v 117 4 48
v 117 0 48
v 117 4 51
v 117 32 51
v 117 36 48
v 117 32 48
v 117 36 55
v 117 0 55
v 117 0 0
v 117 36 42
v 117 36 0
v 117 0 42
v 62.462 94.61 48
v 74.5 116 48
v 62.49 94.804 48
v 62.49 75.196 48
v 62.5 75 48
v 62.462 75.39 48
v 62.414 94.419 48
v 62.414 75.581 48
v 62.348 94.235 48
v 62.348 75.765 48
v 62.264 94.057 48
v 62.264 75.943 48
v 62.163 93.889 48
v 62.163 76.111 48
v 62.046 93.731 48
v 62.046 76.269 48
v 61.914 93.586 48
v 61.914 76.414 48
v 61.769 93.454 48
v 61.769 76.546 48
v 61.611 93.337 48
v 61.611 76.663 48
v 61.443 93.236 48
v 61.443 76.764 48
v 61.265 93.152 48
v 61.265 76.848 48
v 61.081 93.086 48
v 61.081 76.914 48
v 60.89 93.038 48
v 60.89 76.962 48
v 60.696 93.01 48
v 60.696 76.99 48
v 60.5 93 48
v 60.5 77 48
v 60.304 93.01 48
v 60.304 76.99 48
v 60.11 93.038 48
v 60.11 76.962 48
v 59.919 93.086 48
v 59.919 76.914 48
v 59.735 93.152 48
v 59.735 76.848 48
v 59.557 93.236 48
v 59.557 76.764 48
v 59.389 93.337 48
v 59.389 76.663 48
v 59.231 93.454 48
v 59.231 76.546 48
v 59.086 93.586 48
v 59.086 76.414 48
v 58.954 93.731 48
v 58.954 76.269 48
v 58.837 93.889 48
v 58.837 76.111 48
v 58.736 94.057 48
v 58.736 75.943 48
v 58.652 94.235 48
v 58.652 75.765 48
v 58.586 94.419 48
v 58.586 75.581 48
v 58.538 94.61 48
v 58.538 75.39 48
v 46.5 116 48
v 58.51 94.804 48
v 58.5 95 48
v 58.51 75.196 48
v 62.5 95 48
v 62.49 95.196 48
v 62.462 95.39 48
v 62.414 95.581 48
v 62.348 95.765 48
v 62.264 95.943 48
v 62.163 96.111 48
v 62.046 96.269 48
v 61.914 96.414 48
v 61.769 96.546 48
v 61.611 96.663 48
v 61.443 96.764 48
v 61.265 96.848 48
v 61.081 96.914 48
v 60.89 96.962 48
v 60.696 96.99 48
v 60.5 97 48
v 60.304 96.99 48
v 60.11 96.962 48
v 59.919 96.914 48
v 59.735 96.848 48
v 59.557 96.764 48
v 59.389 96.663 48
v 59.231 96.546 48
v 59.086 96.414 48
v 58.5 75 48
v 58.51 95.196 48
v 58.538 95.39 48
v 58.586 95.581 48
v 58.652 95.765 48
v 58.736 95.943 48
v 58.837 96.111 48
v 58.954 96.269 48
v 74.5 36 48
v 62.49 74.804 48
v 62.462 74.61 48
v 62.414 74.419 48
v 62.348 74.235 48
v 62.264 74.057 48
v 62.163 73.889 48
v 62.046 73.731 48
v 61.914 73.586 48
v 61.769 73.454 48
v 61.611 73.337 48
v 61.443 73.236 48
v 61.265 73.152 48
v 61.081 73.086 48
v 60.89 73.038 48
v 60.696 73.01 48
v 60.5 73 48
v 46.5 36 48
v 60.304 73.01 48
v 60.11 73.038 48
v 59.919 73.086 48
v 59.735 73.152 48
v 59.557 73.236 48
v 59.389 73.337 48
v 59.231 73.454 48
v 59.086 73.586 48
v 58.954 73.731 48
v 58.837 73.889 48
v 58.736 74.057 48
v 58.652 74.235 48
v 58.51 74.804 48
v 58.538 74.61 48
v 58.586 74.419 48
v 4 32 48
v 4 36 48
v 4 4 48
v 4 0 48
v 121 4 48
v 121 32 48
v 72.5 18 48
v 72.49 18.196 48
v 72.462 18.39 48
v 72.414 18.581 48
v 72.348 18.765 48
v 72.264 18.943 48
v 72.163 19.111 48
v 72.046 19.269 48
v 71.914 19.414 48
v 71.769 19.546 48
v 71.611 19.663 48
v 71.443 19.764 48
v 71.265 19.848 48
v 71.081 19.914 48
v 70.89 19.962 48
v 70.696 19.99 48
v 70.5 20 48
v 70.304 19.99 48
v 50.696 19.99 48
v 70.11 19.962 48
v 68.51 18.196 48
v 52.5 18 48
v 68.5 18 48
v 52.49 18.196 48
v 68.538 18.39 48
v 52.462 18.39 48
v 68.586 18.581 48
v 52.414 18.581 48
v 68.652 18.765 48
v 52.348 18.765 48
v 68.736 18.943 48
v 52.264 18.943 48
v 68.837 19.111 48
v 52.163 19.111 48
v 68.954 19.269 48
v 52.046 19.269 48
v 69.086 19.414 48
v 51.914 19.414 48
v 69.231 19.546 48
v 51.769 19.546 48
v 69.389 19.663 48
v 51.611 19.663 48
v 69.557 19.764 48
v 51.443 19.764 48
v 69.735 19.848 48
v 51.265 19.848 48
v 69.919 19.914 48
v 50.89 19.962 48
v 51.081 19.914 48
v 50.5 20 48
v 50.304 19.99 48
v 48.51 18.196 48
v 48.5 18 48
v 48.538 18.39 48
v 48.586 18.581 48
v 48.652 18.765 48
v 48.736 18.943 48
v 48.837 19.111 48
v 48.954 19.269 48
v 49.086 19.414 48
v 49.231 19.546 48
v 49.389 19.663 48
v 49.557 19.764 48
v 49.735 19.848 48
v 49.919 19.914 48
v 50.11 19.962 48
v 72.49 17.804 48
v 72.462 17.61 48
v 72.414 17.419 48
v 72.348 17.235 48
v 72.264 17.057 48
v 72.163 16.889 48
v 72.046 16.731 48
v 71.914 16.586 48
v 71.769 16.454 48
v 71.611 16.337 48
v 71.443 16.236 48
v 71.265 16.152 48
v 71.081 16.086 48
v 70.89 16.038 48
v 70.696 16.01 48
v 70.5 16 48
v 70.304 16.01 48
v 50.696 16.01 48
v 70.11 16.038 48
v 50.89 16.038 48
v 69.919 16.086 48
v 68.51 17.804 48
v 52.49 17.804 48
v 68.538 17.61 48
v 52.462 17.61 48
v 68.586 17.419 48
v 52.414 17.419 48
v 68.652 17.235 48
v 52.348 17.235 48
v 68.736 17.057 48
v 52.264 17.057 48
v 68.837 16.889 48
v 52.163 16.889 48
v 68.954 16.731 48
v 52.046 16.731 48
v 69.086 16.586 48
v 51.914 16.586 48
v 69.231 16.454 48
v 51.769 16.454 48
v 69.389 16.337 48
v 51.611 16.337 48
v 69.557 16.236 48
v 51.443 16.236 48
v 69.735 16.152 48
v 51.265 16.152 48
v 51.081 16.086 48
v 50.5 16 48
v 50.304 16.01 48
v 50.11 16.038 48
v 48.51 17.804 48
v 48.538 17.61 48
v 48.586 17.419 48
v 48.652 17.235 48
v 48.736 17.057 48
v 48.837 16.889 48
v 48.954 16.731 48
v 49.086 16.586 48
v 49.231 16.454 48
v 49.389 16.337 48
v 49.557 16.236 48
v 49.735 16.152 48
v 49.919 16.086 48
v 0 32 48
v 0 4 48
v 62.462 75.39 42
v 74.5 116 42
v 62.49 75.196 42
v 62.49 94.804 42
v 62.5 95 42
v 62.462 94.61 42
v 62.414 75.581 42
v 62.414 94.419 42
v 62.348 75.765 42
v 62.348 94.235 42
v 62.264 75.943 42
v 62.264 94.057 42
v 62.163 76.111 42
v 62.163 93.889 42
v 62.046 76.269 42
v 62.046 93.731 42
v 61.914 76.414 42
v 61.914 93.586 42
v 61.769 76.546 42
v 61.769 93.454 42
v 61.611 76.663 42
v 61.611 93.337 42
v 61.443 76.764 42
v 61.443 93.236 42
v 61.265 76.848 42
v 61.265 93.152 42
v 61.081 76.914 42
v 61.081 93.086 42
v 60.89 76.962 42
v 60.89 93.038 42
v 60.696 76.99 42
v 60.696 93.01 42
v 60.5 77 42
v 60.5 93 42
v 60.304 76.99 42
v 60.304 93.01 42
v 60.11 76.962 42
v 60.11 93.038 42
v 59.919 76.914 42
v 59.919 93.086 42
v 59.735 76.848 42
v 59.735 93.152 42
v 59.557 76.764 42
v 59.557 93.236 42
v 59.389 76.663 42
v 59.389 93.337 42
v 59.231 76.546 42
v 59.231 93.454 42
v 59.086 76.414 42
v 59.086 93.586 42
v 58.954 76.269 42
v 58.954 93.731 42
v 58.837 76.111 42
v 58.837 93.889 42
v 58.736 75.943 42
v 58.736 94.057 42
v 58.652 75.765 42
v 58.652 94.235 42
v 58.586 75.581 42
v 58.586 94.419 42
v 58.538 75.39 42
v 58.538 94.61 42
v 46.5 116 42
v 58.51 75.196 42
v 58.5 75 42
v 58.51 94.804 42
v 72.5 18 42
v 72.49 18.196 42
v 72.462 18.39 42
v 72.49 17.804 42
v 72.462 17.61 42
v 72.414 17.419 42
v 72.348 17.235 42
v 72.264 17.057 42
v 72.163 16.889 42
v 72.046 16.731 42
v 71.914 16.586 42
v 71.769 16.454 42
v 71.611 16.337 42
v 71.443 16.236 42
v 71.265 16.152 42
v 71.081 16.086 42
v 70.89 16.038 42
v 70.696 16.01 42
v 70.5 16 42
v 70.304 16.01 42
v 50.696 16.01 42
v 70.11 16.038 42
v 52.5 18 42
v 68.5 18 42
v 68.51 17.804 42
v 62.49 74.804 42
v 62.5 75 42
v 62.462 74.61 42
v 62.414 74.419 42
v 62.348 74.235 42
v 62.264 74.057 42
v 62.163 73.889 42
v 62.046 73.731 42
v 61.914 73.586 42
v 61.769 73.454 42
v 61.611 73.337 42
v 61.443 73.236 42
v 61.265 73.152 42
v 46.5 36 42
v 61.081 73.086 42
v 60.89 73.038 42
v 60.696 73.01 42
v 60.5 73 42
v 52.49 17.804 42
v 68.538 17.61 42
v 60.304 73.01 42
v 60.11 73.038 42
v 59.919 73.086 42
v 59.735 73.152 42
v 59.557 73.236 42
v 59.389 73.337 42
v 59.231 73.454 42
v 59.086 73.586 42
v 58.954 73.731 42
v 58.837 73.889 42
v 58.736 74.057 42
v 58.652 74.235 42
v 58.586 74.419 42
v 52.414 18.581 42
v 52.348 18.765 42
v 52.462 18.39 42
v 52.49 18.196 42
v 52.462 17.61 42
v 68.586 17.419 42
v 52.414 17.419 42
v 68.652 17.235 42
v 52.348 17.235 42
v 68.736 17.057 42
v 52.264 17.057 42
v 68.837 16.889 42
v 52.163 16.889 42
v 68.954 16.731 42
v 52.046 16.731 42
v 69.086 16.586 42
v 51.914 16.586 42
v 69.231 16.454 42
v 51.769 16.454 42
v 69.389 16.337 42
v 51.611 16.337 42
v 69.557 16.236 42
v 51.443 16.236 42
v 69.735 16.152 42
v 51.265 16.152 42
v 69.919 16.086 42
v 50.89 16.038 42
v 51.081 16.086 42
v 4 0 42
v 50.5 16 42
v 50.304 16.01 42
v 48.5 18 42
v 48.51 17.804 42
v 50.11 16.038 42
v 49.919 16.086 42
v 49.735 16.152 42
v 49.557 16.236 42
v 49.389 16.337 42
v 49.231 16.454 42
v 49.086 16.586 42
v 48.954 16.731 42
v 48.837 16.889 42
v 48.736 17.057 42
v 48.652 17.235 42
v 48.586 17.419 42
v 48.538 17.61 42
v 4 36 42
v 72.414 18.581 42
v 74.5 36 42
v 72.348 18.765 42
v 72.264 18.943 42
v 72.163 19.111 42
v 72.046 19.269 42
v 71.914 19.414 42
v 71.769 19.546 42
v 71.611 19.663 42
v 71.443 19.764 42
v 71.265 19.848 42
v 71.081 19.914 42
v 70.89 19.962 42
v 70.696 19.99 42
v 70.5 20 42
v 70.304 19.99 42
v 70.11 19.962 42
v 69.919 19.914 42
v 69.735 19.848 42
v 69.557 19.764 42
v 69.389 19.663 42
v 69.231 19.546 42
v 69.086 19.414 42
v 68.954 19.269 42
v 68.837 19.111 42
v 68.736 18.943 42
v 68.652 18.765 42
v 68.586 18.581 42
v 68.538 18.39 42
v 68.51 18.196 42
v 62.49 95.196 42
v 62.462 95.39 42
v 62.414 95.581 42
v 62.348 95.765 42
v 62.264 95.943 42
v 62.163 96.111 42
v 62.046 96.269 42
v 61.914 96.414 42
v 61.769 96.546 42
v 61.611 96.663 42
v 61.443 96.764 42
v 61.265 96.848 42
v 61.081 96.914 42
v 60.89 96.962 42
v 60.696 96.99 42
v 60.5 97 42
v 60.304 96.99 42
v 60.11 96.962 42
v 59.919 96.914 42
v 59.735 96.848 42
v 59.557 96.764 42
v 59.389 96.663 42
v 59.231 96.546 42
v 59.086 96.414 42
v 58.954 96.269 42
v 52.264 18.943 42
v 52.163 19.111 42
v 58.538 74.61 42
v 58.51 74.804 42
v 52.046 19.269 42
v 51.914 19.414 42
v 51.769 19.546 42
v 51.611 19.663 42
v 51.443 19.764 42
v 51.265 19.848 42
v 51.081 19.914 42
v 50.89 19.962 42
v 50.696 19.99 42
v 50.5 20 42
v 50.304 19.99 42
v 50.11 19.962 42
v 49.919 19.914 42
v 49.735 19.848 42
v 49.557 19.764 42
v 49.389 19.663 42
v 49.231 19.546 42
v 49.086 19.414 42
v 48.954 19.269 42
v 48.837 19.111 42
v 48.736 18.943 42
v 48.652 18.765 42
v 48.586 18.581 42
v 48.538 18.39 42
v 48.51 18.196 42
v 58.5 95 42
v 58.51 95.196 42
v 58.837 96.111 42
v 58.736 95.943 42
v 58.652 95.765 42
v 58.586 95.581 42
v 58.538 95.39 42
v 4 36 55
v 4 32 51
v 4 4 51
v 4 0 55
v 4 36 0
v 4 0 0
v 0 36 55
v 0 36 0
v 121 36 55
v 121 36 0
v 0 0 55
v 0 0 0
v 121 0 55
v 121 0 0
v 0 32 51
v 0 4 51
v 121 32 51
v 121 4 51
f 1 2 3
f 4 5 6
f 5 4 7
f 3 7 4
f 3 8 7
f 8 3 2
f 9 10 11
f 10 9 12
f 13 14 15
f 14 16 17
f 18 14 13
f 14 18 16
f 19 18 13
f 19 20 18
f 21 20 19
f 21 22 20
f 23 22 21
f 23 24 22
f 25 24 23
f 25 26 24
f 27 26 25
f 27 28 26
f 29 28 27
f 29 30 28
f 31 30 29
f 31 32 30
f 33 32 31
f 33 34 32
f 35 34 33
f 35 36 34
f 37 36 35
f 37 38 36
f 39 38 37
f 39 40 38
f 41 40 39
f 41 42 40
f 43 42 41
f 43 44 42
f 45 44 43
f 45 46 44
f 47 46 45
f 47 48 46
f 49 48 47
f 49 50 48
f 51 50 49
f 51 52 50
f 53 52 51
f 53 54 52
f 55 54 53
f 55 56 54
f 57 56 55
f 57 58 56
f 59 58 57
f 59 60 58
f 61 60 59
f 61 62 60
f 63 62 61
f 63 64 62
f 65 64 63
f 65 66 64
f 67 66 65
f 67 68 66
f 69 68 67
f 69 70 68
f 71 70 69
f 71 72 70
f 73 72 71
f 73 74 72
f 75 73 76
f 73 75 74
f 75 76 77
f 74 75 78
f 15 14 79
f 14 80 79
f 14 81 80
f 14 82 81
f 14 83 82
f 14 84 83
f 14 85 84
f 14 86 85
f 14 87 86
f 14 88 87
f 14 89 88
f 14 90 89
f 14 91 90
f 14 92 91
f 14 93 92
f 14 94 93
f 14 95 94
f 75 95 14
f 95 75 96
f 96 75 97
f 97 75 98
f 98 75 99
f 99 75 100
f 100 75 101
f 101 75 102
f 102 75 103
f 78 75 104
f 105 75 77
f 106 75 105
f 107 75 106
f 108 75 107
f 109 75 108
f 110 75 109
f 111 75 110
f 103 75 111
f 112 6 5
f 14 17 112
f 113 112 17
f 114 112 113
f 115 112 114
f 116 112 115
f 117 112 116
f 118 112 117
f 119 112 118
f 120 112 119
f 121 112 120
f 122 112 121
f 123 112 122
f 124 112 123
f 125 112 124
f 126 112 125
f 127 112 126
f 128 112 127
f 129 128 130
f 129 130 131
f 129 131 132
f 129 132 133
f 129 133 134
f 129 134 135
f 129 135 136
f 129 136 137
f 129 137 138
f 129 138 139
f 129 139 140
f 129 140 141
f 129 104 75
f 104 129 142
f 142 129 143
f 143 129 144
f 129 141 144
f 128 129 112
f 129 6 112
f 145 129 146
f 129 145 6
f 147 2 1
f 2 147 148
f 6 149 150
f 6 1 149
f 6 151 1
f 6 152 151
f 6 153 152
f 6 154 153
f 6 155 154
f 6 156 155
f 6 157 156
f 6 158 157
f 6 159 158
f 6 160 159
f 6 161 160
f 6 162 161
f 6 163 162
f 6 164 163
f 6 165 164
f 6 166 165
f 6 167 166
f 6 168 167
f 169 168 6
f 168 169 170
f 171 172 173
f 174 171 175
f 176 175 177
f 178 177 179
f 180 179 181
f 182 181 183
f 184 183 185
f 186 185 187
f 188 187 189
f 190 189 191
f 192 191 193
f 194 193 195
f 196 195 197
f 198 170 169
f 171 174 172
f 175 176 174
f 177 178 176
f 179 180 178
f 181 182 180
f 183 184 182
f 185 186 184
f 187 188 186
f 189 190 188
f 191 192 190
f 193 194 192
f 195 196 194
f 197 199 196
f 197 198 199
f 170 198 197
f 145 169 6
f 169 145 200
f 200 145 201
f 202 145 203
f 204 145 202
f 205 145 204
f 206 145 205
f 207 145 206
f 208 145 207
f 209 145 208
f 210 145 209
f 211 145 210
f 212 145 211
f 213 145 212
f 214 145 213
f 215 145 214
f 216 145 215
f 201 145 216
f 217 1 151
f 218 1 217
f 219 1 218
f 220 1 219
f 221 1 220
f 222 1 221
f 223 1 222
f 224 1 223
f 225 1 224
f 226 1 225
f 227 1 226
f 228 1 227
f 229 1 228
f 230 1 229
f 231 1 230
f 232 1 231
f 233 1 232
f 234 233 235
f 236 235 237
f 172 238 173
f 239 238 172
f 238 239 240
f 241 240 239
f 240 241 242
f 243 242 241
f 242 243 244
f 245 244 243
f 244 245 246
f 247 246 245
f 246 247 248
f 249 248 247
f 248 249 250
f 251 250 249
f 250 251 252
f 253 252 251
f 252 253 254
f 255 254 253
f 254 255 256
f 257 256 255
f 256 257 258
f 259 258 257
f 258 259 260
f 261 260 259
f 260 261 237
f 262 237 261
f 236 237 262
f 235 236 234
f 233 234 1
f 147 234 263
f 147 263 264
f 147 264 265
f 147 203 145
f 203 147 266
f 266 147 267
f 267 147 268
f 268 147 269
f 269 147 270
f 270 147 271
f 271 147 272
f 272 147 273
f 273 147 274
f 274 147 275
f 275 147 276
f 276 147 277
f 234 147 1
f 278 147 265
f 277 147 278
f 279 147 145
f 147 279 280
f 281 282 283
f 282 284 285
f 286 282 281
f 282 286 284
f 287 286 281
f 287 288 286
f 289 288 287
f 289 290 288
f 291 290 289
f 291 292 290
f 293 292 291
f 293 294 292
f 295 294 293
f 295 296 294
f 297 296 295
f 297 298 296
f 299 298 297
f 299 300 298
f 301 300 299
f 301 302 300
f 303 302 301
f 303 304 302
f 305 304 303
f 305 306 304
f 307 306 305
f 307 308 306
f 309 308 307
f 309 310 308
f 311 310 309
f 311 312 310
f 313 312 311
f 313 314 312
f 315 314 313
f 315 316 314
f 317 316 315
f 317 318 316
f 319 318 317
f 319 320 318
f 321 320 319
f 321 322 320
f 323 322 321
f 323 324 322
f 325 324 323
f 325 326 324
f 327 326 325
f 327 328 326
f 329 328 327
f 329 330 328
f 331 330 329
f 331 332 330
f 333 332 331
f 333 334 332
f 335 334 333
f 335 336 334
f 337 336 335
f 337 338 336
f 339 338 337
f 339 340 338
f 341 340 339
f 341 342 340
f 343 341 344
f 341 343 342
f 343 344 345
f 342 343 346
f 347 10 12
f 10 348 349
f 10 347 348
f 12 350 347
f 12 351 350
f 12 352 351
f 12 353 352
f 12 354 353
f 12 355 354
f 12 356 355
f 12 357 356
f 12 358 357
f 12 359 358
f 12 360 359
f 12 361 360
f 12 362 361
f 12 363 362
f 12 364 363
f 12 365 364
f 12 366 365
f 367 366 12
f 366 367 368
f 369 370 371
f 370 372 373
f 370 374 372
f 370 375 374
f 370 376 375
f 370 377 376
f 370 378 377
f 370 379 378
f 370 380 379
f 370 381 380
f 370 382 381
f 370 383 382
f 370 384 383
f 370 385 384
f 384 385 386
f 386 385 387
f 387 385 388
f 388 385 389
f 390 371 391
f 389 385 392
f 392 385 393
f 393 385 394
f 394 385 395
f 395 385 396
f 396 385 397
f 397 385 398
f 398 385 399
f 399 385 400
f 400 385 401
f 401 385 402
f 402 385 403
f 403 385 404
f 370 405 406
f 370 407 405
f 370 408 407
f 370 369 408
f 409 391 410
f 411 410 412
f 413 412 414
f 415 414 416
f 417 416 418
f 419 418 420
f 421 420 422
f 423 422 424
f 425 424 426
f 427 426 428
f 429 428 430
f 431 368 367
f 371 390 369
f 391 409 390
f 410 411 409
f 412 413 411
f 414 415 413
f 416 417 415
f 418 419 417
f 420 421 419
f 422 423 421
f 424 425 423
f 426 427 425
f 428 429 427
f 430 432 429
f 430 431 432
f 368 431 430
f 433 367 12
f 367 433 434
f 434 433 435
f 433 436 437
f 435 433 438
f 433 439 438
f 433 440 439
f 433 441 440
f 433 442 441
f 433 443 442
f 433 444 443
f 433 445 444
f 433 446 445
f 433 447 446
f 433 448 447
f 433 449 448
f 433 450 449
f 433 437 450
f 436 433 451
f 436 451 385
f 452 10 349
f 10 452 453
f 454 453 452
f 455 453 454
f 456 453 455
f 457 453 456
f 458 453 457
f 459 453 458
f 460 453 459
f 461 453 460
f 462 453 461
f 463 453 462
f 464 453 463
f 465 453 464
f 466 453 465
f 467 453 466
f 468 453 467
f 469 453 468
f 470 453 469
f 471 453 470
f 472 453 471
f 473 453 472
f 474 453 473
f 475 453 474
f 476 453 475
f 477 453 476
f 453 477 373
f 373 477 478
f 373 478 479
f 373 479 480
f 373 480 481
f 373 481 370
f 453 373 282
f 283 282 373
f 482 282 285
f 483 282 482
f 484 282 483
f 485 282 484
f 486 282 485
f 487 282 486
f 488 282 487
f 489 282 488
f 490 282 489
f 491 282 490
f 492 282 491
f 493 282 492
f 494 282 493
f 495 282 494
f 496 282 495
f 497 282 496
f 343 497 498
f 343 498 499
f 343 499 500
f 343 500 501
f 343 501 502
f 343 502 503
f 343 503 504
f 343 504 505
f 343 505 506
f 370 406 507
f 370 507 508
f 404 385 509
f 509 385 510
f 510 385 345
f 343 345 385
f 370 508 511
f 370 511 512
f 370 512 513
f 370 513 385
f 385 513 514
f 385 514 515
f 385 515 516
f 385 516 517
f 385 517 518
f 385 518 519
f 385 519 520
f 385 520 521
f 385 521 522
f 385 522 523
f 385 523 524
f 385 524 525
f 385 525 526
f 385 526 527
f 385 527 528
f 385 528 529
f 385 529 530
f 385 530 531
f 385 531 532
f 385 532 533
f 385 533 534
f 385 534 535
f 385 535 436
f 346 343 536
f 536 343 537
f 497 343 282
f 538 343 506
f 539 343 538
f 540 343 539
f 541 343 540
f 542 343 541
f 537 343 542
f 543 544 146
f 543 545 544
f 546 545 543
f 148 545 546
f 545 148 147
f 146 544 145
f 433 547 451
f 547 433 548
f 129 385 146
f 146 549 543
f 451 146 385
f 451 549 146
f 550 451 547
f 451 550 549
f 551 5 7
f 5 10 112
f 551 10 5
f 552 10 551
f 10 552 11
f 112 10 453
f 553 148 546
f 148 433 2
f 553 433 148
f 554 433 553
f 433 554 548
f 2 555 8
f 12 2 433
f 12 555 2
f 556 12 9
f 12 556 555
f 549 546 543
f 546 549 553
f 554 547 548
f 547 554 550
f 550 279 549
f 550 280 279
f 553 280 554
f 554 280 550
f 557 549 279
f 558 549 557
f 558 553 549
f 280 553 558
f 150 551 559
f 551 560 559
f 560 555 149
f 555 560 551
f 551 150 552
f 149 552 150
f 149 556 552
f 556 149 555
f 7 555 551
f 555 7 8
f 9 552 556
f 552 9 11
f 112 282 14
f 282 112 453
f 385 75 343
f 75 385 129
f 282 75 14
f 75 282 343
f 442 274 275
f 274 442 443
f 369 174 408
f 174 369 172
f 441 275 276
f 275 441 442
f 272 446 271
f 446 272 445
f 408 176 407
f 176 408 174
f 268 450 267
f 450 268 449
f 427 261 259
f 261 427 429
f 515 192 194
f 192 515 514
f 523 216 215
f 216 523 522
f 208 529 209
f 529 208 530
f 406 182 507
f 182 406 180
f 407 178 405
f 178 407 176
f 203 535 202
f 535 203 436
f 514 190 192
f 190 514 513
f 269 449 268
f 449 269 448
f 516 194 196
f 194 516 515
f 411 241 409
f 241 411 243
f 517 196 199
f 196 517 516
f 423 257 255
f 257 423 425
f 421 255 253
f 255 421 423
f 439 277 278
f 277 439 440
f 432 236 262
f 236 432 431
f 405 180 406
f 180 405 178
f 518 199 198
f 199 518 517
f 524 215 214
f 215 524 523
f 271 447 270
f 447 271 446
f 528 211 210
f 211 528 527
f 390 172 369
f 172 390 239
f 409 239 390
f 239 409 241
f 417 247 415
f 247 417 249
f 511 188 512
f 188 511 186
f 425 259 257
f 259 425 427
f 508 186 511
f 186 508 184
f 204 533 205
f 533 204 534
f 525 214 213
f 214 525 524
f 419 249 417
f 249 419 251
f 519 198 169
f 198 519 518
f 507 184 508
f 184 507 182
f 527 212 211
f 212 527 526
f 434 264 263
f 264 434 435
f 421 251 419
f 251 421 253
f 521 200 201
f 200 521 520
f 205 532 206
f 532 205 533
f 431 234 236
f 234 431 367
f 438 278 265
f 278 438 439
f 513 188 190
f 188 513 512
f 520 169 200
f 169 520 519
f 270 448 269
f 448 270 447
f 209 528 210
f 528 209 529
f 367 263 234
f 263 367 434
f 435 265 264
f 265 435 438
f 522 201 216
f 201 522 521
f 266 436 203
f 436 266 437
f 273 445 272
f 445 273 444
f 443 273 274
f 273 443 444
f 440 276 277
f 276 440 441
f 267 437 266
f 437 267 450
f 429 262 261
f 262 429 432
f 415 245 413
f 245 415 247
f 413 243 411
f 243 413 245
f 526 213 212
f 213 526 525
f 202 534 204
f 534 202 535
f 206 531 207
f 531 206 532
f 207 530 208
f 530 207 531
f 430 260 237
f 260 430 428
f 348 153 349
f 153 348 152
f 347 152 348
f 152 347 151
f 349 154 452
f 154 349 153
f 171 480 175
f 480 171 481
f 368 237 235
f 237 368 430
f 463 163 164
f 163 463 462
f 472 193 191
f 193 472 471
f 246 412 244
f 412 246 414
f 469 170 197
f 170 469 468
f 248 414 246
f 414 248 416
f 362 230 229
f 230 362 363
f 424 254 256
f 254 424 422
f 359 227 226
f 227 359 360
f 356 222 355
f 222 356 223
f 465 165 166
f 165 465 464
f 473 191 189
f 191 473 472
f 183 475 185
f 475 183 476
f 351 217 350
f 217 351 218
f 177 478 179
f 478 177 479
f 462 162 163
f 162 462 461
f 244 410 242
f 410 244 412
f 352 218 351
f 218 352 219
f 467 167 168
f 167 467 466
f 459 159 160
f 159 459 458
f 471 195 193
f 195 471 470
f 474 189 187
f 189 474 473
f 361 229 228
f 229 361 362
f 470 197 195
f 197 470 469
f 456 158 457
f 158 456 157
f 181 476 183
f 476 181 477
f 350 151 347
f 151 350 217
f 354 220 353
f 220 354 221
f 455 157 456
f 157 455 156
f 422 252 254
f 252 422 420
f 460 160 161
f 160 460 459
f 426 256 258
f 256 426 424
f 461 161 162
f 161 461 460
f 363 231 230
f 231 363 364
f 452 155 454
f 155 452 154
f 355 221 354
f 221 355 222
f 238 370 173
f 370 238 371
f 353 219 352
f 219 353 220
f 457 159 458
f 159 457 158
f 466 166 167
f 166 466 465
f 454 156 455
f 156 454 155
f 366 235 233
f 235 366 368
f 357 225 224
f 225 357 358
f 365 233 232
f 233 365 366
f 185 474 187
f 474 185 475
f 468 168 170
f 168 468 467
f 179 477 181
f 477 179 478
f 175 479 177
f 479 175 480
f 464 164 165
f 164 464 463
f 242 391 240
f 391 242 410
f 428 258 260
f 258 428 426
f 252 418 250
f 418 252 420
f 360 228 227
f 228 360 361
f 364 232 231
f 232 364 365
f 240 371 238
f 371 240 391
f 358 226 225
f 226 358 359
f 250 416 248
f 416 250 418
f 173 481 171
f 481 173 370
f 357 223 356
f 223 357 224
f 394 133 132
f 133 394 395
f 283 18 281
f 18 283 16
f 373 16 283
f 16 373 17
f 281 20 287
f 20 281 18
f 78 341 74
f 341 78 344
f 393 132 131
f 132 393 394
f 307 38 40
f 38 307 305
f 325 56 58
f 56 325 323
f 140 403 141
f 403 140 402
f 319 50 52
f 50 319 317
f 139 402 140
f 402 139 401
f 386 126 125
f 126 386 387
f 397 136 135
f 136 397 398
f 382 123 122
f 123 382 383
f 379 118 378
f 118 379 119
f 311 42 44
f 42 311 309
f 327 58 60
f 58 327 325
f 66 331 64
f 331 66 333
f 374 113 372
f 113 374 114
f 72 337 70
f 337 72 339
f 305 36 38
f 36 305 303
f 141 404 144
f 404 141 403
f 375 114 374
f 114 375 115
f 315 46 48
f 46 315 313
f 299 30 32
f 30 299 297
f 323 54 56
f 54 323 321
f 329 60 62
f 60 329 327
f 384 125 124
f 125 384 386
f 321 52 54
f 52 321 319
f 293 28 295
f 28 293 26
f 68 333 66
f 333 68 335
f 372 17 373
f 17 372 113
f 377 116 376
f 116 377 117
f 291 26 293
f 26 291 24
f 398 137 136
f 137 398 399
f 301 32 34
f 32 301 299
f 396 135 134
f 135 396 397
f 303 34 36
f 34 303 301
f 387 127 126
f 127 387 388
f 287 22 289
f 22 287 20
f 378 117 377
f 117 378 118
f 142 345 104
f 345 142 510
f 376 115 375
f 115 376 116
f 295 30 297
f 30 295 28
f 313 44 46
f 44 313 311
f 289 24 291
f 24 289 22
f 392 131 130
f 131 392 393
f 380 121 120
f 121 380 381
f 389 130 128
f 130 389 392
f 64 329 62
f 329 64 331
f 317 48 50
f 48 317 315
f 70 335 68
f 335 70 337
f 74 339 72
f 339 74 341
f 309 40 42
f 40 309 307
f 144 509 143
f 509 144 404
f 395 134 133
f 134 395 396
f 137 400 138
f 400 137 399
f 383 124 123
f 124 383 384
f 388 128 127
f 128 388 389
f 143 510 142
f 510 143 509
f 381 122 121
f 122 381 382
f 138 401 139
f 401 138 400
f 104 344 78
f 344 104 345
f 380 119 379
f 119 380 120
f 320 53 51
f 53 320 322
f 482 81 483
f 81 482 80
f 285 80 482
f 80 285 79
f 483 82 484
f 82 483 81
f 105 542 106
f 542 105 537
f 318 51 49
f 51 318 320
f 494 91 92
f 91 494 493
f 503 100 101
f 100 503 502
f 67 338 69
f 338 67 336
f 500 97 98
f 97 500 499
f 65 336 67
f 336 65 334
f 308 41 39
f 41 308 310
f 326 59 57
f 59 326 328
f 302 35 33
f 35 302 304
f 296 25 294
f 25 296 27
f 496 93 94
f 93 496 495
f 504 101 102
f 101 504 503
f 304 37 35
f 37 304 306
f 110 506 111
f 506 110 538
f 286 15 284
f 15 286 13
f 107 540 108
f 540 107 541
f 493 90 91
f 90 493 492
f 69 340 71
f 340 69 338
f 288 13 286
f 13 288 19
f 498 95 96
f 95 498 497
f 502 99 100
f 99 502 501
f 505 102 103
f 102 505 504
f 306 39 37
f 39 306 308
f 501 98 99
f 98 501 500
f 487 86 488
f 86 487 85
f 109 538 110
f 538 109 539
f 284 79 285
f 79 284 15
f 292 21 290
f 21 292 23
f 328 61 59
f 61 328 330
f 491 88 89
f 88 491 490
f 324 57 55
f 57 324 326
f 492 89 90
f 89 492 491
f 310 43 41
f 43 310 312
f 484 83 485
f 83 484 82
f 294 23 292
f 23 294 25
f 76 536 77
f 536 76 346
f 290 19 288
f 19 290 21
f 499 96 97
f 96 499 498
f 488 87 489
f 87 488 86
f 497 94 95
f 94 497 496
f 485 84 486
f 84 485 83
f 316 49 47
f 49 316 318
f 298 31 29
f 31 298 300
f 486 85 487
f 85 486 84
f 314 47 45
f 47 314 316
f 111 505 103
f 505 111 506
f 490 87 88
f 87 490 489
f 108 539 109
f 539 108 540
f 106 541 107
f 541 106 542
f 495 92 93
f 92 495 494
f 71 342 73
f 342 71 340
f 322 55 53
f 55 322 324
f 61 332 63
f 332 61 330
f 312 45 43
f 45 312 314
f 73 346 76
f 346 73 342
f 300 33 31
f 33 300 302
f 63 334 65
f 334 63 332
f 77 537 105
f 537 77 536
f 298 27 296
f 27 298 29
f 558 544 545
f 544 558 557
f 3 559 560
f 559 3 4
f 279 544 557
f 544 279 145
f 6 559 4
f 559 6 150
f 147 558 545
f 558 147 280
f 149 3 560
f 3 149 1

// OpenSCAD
difference(){
    union(){
        translate([4,0,42])
        cube([113,36,6]);
        cube([4,36,55]);
        translate([117,0,0])
        cube([4,36,55]);
        translate([(121/2-14),36,42])
        cube([28,80,6]);
        }
translate([-2,4,48])
cube([126,28,3]);

$fn=64;
union(){
    translate([(121/2-10),18,30])
    cylinder(h=60,d=4,center=true);
    translate([(121/2+10),18,30])
    cylinder(h=60,d=4,center=true);
    translate([121/2,75,30])
    cylinder(h=60,d=4,center=true);
    translate([121/2,95,30])
    cylinder(h=60,d=4,center=true);
    }
}
